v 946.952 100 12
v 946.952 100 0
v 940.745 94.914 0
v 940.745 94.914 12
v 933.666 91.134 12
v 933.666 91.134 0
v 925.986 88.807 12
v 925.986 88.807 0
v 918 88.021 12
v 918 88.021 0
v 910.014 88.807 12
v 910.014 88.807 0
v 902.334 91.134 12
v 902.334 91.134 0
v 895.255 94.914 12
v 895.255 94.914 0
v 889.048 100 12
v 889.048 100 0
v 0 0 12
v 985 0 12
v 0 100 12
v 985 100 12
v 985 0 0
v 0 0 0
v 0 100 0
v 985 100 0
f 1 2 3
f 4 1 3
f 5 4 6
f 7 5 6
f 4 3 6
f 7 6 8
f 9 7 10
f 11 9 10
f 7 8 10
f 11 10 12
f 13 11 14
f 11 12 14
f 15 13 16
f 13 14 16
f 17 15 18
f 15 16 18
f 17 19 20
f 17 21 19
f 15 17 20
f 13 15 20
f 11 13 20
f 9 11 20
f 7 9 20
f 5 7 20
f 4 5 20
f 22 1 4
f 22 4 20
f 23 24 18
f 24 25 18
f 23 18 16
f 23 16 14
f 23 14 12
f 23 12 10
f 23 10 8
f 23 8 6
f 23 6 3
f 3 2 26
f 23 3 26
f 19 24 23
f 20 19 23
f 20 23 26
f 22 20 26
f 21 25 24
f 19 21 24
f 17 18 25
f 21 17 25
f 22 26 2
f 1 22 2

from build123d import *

# Parameters (mm, degrees)
SALIENTE_EXTRUIR1_DEPTH = 12


with BuildPart() as part:
    # Croquis1 → Saliente-Extruir1 (new body)
    with BuildSketch(Plane.XY):
        with BuildLine():
            Line((0, 0), (985, 0))
            Line((985, 0), (985, 100))
            Line((985, 100), (946.952353927, 100))
            ThreePointArc((946.952353927, 100), (918, 88.021483703), (889.047646073, 100))
            Line((889.047646073, 100), (0, 100))
            Line((0, 100), (0, 0))
        make_face()
    extrude(amount=SALIENTE_EXTRUIR1_DEPTH)


solid = part.part
